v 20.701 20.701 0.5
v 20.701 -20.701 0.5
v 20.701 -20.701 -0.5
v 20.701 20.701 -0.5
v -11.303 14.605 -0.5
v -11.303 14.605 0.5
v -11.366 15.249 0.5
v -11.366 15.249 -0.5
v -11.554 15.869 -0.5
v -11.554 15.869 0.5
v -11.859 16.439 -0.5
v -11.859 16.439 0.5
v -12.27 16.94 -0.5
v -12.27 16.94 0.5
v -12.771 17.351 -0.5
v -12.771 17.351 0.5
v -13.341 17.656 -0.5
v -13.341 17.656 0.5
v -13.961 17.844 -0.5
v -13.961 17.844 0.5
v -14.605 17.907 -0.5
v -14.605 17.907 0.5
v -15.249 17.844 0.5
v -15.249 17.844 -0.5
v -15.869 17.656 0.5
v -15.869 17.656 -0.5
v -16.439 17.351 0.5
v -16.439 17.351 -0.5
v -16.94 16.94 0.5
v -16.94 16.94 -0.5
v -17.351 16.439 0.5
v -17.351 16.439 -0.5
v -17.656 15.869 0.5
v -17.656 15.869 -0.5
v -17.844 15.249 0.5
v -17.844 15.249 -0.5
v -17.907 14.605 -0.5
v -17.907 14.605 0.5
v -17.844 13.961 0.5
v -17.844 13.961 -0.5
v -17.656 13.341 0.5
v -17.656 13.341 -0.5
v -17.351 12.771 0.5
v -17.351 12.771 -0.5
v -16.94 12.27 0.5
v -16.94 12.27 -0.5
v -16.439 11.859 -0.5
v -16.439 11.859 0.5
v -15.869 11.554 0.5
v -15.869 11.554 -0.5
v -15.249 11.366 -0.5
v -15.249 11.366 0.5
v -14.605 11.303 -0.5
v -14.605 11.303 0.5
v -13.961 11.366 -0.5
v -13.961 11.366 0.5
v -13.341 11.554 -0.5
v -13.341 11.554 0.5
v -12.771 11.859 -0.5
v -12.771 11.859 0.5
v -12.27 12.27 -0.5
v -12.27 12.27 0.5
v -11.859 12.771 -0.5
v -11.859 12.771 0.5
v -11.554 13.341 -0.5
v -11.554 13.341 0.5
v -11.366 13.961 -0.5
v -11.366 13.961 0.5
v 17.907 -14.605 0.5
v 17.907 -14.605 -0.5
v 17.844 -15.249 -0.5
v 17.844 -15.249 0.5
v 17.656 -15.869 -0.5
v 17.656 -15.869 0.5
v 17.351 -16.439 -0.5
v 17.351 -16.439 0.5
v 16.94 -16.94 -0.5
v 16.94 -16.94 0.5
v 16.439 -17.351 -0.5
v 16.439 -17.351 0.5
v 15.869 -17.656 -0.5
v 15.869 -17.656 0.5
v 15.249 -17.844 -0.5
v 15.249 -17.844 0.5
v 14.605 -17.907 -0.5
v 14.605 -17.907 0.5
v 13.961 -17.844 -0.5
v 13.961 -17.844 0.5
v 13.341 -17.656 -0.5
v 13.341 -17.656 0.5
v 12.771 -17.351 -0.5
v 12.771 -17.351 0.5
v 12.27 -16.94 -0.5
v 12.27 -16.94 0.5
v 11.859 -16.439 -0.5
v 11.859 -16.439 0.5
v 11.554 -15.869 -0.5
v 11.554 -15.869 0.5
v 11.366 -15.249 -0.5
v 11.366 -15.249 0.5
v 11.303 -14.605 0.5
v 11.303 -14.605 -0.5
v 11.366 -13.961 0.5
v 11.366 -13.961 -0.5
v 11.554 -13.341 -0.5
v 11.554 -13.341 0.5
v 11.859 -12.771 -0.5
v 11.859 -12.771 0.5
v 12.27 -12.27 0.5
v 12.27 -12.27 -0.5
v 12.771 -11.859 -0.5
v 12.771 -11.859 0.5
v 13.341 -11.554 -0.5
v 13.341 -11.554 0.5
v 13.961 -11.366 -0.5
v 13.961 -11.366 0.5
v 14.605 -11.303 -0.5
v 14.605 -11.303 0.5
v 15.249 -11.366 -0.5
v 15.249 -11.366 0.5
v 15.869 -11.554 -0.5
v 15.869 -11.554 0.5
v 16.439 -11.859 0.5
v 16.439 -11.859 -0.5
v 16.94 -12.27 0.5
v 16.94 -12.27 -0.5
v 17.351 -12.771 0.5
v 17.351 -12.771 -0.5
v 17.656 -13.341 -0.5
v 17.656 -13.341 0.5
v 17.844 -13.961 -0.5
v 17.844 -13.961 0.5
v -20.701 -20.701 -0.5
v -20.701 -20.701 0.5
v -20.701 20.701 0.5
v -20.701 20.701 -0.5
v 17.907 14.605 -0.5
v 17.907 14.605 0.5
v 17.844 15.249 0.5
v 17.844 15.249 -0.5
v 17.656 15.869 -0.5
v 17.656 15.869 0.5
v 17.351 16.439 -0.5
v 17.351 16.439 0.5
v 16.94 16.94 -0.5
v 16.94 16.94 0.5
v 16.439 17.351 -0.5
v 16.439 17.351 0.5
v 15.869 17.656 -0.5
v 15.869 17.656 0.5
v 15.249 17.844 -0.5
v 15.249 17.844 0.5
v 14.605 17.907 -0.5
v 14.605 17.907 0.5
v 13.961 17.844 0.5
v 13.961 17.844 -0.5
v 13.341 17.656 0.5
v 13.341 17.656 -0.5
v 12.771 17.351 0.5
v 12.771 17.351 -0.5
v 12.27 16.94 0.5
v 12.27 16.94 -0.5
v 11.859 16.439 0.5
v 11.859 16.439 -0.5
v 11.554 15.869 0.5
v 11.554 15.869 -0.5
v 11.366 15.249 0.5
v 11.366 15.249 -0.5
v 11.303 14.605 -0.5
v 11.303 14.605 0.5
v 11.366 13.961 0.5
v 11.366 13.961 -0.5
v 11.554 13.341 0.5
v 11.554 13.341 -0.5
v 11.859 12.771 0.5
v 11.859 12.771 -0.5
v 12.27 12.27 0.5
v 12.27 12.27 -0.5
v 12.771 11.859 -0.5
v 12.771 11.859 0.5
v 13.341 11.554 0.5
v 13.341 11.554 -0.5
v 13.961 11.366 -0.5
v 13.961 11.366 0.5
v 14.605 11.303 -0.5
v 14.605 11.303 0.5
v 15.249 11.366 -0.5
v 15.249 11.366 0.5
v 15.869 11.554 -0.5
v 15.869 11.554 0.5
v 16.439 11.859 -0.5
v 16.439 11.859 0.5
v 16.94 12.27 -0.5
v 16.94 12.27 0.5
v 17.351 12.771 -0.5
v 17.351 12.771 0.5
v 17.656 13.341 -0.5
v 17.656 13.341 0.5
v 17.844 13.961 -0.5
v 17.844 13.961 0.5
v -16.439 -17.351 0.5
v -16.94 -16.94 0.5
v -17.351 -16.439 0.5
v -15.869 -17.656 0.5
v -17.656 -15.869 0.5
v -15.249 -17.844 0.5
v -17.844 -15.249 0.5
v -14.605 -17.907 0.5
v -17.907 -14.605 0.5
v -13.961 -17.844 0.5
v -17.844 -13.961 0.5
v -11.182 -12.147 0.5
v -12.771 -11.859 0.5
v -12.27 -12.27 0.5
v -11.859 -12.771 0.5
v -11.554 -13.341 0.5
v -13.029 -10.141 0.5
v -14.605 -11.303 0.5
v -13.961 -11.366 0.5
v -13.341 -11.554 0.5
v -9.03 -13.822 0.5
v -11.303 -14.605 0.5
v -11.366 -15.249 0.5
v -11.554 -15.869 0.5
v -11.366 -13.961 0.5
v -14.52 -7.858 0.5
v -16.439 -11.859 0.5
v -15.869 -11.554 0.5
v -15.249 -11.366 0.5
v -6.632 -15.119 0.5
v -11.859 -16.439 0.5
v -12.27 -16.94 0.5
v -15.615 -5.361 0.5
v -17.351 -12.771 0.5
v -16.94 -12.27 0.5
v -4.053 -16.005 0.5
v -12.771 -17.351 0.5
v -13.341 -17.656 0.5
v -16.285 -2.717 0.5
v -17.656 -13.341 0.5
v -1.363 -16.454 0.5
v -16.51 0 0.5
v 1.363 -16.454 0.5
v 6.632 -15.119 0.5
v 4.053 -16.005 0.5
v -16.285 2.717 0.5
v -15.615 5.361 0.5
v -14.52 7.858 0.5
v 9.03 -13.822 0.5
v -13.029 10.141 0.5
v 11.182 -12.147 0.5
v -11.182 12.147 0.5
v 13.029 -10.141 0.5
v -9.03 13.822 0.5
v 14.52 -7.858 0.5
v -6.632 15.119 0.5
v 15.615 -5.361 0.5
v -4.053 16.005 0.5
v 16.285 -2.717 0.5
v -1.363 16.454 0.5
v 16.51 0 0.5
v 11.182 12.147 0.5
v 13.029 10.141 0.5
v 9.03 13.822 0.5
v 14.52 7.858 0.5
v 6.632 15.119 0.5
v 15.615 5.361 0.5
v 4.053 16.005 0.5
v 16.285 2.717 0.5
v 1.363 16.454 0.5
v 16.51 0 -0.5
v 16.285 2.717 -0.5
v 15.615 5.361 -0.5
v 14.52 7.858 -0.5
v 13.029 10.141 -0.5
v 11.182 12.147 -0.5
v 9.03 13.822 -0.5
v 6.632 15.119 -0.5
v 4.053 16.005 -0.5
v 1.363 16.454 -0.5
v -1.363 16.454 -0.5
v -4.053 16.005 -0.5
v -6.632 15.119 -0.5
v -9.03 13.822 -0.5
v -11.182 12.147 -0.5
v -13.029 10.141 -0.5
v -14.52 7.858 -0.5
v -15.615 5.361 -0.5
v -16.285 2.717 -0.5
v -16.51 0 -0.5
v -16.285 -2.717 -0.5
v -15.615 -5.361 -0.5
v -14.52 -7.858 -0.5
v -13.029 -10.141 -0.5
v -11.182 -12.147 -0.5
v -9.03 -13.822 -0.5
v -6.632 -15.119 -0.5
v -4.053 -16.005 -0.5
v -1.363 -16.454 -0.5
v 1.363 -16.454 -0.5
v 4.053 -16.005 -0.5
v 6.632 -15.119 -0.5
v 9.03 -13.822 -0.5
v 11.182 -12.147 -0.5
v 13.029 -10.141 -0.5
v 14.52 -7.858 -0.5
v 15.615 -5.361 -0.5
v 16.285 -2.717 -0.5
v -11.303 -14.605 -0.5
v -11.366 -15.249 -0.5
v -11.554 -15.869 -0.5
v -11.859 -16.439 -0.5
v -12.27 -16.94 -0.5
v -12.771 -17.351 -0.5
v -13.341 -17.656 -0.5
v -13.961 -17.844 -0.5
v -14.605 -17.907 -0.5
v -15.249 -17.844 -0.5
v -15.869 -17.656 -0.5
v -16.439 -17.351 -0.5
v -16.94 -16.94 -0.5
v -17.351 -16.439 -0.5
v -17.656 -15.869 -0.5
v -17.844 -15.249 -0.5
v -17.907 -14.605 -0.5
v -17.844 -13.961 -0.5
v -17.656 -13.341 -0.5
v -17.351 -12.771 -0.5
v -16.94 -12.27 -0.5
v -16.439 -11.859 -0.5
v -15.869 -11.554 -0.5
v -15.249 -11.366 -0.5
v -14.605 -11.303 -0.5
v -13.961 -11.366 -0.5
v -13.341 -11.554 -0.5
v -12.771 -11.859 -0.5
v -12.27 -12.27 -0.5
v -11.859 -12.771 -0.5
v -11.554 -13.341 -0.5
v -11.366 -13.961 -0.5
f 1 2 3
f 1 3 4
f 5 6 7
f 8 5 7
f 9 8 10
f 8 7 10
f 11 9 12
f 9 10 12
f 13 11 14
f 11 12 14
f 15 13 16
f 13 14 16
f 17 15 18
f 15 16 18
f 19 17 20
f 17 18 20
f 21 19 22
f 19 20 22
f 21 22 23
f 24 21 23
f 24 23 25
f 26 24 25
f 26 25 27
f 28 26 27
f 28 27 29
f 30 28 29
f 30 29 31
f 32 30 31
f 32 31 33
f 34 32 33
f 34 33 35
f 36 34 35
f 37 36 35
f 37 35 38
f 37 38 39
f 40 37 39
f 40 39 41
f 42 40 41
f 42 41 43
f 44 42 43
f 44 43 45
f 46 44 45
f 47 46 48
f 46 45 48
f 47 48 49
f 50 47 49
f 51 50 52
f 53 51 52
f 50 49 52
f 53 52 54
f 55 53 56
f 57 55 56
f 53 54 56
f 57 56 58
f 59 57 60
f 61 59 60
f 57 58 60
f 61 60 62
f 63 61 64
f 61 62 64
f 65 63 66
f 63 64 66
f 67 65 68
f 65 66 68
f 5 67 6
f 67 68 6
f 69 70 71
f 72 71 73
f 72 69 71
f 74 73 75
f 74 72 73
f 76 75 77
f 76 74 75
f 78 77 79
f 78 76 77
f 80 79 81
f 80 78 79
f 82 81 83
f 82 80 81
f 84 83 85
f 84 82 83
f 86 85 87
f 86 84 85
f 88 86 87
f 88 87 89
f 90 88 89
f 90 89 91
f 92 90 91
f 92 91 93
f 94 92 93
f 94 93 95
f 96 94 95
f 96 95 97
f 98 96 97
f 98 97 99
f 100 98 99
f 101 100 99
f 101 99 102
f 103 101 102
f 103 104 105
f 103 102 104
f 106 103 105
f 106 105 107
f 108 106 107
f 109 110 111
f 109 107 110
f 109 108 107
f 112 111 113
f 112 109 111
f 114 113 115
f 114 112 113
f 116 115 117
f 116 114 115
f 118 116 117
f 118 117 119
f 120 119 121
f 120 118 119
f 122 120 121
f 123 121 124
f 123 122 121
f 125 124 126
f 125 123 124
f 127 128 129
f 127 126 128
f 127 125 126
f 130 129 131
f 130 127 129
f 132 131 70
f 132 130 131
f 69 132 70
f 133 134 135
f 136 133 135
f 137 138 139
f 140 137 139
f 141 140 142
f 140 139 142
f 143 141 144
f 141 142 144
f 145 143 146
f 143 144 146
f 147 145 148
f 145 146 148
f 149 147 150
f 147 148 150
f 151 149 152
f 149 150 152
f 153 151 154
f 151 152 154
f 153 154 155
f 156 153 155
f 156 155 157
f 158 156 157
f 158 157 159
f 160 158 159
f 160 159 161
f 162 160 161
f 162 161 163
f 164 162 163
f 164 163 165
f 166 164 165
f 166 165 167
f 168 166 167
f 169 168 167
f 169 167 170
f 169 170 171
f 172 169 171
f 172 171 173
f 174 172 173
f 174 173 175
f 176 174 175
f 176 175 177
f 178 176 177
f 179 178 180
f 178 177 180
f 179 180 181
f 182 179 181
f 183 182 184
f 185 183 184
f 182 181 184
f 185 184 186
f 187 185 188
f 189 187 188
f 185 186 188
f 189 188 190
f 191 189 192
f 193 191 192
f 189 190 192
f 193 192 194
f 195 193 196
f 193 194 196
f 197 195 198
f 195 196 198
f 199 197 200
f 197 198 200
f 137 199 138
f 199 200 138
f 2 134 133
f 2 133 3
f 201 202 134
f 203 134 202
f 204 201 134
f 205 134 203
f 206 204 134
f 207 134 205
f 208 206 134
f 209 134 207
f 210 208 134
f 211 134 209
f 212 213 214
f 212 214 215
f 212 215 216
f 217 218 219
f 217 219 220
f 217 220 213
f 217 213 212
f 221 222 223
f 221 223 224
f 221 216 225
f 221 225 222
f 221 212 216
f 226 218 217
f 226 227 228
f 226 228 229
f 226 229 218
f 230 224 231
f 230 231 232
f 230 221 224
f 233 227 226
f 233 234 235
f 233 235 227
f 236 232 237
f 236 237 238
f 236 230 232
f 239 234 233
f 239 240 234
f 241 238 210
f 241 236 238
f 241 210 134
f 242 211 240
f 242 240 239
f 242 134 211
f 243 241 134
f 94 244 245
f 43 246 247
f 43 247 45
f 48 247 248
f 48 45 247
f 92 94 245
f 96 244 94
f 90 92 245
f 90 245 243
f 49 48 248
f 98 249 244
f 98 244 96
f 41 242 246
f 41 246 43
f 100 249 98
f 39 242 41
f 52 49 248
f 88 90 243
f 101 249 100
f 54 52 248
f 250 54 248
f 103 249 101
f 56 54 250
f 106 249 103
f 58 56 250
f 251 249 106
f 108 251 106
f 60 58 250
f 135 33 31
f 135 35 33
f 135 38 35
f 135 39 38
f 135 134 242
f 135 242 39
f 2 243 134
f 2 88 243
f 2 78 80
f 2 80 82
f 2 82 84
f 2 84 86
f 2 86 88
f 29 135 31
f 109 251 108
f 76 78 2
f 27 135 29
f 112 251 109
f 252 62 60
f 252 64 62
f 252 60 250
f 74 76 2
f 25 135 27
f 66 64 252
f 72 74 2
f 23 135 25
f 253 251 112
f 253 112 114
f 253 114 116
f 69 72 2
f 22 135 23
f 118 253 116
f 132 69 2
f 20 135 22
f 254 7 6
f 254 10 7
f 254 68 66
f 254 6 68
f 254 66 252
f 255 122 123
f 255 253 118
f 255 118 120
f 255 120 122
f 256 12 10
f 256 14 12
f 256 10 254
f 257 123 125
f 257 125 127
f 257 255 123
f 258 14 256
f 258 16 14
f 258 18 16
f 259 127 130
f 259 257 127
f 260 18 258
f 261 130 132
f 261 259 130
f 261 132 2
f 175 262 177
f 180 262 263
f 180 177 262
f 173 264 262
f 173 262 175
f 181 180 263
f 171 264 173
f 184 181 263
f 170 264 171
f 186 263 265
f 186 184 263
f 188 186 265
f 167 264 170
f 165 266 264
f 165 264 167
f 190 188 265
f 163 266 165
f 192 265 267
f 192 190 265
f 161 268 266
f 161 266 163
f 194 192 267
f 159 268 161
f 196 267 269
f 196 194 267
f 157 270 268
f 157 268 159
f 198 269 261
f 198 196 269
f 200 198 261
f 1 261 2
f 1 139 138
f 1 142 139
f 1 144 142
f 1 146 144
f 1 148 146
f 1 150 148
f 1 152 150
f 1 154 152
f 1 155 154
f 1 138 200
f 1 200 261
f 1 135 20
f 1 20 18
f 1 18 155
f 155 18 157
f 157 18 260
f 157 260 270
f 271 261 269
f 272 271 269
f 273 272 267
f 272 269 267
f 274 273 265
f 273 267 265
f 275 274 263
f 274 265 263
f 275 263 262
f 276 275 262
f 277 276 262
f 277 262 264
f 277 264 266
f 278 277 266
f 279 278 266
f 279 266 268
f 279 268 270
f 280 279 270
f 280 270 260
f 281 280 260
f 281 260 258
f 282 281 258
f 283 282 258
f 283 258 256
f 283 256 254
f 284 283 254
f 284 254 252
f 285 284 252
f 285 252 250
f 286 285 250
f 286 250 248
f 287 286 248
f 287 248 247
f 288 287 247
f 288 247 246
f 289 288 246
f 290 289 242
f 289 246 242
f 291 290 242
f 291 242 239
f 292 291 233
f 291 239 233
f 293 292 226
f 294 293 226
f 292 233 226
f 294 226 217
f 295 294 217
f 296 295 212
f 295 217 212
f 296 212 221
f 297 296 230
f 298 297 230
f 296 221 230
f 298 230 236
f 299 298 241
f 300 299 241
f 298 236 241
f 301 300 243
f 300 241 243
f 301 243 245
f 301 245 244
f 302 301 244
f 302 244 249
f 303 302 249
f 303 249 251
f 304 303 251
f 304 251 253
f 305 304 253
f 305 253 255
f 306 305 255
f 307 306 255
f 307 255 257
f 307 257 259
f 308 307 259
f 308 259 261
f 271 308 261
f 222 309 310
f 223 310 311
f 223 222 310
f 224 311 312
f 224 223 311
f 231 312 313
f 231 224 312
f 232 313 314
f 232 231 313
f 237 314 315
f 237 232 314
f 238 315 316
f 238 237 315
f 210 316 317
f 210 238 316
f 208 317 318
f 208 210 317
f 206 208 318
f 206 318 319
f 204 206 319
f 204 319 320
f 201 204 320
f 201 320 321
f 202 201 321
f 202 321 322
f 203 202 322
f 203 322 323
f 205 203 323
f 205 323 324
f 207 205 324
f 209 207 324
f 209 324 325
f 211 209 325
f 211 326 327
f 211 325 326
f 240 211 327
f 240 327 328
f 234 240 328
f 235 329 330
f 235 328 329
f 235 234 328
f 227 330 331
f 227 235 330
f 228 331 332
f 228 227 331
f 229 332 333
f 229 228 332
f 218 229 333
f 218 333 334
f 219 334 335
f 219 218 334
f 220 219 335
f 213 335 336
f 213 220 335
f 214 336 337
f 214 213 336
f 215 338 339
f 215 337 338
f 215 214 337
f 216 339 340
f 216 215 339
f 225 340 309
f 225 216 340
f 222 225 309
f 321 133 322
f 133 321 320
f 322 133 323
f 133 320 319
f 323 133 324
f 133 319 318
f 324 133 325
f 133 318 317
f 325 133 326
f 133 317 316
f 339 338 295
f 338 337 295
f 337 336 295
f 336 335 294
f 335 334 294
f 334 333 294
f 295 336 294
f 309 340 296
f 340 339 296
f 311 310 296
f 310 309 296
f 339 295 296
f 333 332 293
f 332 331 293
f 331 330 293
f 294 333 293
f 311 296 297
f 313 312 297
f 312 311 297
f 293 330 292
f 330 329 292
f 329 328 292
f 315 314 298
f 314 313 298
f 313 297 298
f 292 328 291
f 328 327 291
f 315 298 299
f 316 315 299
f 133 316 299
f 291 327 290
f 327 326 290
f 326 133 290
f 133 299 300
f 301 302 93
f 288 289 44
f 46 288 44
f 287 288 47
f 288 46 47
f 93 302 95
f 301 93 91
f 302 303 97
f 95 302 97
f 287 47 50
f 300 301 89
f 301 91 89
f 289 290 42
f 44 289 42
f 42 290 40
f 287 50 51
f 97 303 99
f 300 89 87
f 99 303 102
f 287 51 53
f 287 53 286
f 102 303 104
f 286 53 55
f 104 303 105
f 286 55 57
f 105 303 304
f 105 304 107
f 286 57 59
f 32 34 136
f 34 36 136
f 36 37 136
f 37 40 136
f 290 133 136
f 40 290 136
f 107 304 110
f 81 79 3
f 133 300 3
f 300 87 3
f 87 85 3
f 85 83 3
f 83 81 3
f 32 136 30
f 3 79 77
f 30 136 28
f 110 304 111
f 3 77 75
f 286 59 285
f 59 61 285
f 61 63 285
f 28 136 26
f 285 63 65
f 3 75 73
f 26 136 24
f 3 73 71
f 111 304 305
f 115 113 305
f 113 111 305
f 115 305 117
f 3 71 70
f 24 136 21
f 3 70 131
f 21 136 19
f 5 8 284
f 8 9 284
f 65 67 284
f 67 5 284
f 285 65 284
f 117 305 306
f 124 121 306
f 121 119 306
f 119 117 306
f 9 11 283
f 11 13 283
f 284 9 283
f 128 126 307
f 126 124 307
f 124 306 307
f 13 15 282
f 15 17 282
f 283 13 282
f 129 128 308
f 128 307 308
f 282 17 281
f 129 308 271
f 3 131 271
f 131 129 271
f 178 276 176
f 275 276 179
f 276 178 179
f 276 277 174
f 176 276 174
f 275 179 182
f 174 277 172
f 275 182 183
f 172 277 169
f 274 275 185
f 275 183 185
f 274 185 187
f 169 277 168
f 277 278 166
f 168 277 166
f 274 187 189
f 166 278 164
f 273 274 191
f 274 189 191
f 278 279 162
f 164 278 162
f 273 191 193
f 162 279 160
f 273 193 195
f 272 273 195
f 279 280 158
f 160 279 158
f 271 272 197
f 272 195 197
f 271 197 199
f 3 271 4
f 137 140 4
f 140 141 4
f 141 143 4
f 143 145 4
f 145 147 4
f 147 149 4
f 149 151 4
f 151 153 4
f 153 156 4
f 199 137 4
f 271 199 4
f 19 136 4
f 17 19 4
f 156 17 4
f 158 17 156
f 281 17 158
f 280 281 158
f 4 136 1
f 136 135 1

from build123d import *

# Parameters (mm, degrees)
BOSS_EXTRUDE1_DEPTH      = 0.499999
BOSS_EXTRUDE1_DEPTH_BACK = 0.499999
SKETCH1_W                = 41.402
SKETCH1_H                = 41.402
SKETCH3_R                = 16.51
CUT_EXTRUDE1_DEPTH       = 30.292708956
SKETCH6_R                = 3.302
CUT_EXTRUDE2_DEPTH       = 30.292708956


with BuildPart() as part:
    # Sketch1 → Boss-Extrude1 (new, two sides: drawn at the far end of the back side and taken through both)
    with BuildSketch(Plane.XY.offset(-BOSS_EXTRUDE1_DEPTH_BACK)):
        Rectangle(SKETCH1_W, SKETCH1_H)
    extrude(amount=BOSS_EXTRUDE1_DEPTH + BOSS_EXTRUDE1_DEPTH_BACK)

    # Sketch3 → Cut-Extrude1 (cut, through all)
    with BuildSketch(Plane.XY.offset(0.499999)):
        Circle(SKETCH3_R)
    extrude(amount=-CUT_EXTRUDE1_DEPTH, mode=Mode.SUBTRACT)

    # Sketch6 → Cut-Extrude2 (cut, through all)
    with BuildSketch(Plane.XY.offset(0.499999)):
        with Locations((-14.605, 14.605)):
            Circle(SKETCH6_R)
        with Locations((14.605, 14.605)):
            Circle(SKETCH6_R)
    cut_extrude2 = extrude(amount=-CUT_EXTRUDE2_DEPTH, mode=Mode.SUBTRACT)

    # Mirror1: Cut-Extrude2 across plane
    add(cut_extrude2.mirror(Plane.ZX), mode=Mode.SUBTRACT)


solid = part.part
